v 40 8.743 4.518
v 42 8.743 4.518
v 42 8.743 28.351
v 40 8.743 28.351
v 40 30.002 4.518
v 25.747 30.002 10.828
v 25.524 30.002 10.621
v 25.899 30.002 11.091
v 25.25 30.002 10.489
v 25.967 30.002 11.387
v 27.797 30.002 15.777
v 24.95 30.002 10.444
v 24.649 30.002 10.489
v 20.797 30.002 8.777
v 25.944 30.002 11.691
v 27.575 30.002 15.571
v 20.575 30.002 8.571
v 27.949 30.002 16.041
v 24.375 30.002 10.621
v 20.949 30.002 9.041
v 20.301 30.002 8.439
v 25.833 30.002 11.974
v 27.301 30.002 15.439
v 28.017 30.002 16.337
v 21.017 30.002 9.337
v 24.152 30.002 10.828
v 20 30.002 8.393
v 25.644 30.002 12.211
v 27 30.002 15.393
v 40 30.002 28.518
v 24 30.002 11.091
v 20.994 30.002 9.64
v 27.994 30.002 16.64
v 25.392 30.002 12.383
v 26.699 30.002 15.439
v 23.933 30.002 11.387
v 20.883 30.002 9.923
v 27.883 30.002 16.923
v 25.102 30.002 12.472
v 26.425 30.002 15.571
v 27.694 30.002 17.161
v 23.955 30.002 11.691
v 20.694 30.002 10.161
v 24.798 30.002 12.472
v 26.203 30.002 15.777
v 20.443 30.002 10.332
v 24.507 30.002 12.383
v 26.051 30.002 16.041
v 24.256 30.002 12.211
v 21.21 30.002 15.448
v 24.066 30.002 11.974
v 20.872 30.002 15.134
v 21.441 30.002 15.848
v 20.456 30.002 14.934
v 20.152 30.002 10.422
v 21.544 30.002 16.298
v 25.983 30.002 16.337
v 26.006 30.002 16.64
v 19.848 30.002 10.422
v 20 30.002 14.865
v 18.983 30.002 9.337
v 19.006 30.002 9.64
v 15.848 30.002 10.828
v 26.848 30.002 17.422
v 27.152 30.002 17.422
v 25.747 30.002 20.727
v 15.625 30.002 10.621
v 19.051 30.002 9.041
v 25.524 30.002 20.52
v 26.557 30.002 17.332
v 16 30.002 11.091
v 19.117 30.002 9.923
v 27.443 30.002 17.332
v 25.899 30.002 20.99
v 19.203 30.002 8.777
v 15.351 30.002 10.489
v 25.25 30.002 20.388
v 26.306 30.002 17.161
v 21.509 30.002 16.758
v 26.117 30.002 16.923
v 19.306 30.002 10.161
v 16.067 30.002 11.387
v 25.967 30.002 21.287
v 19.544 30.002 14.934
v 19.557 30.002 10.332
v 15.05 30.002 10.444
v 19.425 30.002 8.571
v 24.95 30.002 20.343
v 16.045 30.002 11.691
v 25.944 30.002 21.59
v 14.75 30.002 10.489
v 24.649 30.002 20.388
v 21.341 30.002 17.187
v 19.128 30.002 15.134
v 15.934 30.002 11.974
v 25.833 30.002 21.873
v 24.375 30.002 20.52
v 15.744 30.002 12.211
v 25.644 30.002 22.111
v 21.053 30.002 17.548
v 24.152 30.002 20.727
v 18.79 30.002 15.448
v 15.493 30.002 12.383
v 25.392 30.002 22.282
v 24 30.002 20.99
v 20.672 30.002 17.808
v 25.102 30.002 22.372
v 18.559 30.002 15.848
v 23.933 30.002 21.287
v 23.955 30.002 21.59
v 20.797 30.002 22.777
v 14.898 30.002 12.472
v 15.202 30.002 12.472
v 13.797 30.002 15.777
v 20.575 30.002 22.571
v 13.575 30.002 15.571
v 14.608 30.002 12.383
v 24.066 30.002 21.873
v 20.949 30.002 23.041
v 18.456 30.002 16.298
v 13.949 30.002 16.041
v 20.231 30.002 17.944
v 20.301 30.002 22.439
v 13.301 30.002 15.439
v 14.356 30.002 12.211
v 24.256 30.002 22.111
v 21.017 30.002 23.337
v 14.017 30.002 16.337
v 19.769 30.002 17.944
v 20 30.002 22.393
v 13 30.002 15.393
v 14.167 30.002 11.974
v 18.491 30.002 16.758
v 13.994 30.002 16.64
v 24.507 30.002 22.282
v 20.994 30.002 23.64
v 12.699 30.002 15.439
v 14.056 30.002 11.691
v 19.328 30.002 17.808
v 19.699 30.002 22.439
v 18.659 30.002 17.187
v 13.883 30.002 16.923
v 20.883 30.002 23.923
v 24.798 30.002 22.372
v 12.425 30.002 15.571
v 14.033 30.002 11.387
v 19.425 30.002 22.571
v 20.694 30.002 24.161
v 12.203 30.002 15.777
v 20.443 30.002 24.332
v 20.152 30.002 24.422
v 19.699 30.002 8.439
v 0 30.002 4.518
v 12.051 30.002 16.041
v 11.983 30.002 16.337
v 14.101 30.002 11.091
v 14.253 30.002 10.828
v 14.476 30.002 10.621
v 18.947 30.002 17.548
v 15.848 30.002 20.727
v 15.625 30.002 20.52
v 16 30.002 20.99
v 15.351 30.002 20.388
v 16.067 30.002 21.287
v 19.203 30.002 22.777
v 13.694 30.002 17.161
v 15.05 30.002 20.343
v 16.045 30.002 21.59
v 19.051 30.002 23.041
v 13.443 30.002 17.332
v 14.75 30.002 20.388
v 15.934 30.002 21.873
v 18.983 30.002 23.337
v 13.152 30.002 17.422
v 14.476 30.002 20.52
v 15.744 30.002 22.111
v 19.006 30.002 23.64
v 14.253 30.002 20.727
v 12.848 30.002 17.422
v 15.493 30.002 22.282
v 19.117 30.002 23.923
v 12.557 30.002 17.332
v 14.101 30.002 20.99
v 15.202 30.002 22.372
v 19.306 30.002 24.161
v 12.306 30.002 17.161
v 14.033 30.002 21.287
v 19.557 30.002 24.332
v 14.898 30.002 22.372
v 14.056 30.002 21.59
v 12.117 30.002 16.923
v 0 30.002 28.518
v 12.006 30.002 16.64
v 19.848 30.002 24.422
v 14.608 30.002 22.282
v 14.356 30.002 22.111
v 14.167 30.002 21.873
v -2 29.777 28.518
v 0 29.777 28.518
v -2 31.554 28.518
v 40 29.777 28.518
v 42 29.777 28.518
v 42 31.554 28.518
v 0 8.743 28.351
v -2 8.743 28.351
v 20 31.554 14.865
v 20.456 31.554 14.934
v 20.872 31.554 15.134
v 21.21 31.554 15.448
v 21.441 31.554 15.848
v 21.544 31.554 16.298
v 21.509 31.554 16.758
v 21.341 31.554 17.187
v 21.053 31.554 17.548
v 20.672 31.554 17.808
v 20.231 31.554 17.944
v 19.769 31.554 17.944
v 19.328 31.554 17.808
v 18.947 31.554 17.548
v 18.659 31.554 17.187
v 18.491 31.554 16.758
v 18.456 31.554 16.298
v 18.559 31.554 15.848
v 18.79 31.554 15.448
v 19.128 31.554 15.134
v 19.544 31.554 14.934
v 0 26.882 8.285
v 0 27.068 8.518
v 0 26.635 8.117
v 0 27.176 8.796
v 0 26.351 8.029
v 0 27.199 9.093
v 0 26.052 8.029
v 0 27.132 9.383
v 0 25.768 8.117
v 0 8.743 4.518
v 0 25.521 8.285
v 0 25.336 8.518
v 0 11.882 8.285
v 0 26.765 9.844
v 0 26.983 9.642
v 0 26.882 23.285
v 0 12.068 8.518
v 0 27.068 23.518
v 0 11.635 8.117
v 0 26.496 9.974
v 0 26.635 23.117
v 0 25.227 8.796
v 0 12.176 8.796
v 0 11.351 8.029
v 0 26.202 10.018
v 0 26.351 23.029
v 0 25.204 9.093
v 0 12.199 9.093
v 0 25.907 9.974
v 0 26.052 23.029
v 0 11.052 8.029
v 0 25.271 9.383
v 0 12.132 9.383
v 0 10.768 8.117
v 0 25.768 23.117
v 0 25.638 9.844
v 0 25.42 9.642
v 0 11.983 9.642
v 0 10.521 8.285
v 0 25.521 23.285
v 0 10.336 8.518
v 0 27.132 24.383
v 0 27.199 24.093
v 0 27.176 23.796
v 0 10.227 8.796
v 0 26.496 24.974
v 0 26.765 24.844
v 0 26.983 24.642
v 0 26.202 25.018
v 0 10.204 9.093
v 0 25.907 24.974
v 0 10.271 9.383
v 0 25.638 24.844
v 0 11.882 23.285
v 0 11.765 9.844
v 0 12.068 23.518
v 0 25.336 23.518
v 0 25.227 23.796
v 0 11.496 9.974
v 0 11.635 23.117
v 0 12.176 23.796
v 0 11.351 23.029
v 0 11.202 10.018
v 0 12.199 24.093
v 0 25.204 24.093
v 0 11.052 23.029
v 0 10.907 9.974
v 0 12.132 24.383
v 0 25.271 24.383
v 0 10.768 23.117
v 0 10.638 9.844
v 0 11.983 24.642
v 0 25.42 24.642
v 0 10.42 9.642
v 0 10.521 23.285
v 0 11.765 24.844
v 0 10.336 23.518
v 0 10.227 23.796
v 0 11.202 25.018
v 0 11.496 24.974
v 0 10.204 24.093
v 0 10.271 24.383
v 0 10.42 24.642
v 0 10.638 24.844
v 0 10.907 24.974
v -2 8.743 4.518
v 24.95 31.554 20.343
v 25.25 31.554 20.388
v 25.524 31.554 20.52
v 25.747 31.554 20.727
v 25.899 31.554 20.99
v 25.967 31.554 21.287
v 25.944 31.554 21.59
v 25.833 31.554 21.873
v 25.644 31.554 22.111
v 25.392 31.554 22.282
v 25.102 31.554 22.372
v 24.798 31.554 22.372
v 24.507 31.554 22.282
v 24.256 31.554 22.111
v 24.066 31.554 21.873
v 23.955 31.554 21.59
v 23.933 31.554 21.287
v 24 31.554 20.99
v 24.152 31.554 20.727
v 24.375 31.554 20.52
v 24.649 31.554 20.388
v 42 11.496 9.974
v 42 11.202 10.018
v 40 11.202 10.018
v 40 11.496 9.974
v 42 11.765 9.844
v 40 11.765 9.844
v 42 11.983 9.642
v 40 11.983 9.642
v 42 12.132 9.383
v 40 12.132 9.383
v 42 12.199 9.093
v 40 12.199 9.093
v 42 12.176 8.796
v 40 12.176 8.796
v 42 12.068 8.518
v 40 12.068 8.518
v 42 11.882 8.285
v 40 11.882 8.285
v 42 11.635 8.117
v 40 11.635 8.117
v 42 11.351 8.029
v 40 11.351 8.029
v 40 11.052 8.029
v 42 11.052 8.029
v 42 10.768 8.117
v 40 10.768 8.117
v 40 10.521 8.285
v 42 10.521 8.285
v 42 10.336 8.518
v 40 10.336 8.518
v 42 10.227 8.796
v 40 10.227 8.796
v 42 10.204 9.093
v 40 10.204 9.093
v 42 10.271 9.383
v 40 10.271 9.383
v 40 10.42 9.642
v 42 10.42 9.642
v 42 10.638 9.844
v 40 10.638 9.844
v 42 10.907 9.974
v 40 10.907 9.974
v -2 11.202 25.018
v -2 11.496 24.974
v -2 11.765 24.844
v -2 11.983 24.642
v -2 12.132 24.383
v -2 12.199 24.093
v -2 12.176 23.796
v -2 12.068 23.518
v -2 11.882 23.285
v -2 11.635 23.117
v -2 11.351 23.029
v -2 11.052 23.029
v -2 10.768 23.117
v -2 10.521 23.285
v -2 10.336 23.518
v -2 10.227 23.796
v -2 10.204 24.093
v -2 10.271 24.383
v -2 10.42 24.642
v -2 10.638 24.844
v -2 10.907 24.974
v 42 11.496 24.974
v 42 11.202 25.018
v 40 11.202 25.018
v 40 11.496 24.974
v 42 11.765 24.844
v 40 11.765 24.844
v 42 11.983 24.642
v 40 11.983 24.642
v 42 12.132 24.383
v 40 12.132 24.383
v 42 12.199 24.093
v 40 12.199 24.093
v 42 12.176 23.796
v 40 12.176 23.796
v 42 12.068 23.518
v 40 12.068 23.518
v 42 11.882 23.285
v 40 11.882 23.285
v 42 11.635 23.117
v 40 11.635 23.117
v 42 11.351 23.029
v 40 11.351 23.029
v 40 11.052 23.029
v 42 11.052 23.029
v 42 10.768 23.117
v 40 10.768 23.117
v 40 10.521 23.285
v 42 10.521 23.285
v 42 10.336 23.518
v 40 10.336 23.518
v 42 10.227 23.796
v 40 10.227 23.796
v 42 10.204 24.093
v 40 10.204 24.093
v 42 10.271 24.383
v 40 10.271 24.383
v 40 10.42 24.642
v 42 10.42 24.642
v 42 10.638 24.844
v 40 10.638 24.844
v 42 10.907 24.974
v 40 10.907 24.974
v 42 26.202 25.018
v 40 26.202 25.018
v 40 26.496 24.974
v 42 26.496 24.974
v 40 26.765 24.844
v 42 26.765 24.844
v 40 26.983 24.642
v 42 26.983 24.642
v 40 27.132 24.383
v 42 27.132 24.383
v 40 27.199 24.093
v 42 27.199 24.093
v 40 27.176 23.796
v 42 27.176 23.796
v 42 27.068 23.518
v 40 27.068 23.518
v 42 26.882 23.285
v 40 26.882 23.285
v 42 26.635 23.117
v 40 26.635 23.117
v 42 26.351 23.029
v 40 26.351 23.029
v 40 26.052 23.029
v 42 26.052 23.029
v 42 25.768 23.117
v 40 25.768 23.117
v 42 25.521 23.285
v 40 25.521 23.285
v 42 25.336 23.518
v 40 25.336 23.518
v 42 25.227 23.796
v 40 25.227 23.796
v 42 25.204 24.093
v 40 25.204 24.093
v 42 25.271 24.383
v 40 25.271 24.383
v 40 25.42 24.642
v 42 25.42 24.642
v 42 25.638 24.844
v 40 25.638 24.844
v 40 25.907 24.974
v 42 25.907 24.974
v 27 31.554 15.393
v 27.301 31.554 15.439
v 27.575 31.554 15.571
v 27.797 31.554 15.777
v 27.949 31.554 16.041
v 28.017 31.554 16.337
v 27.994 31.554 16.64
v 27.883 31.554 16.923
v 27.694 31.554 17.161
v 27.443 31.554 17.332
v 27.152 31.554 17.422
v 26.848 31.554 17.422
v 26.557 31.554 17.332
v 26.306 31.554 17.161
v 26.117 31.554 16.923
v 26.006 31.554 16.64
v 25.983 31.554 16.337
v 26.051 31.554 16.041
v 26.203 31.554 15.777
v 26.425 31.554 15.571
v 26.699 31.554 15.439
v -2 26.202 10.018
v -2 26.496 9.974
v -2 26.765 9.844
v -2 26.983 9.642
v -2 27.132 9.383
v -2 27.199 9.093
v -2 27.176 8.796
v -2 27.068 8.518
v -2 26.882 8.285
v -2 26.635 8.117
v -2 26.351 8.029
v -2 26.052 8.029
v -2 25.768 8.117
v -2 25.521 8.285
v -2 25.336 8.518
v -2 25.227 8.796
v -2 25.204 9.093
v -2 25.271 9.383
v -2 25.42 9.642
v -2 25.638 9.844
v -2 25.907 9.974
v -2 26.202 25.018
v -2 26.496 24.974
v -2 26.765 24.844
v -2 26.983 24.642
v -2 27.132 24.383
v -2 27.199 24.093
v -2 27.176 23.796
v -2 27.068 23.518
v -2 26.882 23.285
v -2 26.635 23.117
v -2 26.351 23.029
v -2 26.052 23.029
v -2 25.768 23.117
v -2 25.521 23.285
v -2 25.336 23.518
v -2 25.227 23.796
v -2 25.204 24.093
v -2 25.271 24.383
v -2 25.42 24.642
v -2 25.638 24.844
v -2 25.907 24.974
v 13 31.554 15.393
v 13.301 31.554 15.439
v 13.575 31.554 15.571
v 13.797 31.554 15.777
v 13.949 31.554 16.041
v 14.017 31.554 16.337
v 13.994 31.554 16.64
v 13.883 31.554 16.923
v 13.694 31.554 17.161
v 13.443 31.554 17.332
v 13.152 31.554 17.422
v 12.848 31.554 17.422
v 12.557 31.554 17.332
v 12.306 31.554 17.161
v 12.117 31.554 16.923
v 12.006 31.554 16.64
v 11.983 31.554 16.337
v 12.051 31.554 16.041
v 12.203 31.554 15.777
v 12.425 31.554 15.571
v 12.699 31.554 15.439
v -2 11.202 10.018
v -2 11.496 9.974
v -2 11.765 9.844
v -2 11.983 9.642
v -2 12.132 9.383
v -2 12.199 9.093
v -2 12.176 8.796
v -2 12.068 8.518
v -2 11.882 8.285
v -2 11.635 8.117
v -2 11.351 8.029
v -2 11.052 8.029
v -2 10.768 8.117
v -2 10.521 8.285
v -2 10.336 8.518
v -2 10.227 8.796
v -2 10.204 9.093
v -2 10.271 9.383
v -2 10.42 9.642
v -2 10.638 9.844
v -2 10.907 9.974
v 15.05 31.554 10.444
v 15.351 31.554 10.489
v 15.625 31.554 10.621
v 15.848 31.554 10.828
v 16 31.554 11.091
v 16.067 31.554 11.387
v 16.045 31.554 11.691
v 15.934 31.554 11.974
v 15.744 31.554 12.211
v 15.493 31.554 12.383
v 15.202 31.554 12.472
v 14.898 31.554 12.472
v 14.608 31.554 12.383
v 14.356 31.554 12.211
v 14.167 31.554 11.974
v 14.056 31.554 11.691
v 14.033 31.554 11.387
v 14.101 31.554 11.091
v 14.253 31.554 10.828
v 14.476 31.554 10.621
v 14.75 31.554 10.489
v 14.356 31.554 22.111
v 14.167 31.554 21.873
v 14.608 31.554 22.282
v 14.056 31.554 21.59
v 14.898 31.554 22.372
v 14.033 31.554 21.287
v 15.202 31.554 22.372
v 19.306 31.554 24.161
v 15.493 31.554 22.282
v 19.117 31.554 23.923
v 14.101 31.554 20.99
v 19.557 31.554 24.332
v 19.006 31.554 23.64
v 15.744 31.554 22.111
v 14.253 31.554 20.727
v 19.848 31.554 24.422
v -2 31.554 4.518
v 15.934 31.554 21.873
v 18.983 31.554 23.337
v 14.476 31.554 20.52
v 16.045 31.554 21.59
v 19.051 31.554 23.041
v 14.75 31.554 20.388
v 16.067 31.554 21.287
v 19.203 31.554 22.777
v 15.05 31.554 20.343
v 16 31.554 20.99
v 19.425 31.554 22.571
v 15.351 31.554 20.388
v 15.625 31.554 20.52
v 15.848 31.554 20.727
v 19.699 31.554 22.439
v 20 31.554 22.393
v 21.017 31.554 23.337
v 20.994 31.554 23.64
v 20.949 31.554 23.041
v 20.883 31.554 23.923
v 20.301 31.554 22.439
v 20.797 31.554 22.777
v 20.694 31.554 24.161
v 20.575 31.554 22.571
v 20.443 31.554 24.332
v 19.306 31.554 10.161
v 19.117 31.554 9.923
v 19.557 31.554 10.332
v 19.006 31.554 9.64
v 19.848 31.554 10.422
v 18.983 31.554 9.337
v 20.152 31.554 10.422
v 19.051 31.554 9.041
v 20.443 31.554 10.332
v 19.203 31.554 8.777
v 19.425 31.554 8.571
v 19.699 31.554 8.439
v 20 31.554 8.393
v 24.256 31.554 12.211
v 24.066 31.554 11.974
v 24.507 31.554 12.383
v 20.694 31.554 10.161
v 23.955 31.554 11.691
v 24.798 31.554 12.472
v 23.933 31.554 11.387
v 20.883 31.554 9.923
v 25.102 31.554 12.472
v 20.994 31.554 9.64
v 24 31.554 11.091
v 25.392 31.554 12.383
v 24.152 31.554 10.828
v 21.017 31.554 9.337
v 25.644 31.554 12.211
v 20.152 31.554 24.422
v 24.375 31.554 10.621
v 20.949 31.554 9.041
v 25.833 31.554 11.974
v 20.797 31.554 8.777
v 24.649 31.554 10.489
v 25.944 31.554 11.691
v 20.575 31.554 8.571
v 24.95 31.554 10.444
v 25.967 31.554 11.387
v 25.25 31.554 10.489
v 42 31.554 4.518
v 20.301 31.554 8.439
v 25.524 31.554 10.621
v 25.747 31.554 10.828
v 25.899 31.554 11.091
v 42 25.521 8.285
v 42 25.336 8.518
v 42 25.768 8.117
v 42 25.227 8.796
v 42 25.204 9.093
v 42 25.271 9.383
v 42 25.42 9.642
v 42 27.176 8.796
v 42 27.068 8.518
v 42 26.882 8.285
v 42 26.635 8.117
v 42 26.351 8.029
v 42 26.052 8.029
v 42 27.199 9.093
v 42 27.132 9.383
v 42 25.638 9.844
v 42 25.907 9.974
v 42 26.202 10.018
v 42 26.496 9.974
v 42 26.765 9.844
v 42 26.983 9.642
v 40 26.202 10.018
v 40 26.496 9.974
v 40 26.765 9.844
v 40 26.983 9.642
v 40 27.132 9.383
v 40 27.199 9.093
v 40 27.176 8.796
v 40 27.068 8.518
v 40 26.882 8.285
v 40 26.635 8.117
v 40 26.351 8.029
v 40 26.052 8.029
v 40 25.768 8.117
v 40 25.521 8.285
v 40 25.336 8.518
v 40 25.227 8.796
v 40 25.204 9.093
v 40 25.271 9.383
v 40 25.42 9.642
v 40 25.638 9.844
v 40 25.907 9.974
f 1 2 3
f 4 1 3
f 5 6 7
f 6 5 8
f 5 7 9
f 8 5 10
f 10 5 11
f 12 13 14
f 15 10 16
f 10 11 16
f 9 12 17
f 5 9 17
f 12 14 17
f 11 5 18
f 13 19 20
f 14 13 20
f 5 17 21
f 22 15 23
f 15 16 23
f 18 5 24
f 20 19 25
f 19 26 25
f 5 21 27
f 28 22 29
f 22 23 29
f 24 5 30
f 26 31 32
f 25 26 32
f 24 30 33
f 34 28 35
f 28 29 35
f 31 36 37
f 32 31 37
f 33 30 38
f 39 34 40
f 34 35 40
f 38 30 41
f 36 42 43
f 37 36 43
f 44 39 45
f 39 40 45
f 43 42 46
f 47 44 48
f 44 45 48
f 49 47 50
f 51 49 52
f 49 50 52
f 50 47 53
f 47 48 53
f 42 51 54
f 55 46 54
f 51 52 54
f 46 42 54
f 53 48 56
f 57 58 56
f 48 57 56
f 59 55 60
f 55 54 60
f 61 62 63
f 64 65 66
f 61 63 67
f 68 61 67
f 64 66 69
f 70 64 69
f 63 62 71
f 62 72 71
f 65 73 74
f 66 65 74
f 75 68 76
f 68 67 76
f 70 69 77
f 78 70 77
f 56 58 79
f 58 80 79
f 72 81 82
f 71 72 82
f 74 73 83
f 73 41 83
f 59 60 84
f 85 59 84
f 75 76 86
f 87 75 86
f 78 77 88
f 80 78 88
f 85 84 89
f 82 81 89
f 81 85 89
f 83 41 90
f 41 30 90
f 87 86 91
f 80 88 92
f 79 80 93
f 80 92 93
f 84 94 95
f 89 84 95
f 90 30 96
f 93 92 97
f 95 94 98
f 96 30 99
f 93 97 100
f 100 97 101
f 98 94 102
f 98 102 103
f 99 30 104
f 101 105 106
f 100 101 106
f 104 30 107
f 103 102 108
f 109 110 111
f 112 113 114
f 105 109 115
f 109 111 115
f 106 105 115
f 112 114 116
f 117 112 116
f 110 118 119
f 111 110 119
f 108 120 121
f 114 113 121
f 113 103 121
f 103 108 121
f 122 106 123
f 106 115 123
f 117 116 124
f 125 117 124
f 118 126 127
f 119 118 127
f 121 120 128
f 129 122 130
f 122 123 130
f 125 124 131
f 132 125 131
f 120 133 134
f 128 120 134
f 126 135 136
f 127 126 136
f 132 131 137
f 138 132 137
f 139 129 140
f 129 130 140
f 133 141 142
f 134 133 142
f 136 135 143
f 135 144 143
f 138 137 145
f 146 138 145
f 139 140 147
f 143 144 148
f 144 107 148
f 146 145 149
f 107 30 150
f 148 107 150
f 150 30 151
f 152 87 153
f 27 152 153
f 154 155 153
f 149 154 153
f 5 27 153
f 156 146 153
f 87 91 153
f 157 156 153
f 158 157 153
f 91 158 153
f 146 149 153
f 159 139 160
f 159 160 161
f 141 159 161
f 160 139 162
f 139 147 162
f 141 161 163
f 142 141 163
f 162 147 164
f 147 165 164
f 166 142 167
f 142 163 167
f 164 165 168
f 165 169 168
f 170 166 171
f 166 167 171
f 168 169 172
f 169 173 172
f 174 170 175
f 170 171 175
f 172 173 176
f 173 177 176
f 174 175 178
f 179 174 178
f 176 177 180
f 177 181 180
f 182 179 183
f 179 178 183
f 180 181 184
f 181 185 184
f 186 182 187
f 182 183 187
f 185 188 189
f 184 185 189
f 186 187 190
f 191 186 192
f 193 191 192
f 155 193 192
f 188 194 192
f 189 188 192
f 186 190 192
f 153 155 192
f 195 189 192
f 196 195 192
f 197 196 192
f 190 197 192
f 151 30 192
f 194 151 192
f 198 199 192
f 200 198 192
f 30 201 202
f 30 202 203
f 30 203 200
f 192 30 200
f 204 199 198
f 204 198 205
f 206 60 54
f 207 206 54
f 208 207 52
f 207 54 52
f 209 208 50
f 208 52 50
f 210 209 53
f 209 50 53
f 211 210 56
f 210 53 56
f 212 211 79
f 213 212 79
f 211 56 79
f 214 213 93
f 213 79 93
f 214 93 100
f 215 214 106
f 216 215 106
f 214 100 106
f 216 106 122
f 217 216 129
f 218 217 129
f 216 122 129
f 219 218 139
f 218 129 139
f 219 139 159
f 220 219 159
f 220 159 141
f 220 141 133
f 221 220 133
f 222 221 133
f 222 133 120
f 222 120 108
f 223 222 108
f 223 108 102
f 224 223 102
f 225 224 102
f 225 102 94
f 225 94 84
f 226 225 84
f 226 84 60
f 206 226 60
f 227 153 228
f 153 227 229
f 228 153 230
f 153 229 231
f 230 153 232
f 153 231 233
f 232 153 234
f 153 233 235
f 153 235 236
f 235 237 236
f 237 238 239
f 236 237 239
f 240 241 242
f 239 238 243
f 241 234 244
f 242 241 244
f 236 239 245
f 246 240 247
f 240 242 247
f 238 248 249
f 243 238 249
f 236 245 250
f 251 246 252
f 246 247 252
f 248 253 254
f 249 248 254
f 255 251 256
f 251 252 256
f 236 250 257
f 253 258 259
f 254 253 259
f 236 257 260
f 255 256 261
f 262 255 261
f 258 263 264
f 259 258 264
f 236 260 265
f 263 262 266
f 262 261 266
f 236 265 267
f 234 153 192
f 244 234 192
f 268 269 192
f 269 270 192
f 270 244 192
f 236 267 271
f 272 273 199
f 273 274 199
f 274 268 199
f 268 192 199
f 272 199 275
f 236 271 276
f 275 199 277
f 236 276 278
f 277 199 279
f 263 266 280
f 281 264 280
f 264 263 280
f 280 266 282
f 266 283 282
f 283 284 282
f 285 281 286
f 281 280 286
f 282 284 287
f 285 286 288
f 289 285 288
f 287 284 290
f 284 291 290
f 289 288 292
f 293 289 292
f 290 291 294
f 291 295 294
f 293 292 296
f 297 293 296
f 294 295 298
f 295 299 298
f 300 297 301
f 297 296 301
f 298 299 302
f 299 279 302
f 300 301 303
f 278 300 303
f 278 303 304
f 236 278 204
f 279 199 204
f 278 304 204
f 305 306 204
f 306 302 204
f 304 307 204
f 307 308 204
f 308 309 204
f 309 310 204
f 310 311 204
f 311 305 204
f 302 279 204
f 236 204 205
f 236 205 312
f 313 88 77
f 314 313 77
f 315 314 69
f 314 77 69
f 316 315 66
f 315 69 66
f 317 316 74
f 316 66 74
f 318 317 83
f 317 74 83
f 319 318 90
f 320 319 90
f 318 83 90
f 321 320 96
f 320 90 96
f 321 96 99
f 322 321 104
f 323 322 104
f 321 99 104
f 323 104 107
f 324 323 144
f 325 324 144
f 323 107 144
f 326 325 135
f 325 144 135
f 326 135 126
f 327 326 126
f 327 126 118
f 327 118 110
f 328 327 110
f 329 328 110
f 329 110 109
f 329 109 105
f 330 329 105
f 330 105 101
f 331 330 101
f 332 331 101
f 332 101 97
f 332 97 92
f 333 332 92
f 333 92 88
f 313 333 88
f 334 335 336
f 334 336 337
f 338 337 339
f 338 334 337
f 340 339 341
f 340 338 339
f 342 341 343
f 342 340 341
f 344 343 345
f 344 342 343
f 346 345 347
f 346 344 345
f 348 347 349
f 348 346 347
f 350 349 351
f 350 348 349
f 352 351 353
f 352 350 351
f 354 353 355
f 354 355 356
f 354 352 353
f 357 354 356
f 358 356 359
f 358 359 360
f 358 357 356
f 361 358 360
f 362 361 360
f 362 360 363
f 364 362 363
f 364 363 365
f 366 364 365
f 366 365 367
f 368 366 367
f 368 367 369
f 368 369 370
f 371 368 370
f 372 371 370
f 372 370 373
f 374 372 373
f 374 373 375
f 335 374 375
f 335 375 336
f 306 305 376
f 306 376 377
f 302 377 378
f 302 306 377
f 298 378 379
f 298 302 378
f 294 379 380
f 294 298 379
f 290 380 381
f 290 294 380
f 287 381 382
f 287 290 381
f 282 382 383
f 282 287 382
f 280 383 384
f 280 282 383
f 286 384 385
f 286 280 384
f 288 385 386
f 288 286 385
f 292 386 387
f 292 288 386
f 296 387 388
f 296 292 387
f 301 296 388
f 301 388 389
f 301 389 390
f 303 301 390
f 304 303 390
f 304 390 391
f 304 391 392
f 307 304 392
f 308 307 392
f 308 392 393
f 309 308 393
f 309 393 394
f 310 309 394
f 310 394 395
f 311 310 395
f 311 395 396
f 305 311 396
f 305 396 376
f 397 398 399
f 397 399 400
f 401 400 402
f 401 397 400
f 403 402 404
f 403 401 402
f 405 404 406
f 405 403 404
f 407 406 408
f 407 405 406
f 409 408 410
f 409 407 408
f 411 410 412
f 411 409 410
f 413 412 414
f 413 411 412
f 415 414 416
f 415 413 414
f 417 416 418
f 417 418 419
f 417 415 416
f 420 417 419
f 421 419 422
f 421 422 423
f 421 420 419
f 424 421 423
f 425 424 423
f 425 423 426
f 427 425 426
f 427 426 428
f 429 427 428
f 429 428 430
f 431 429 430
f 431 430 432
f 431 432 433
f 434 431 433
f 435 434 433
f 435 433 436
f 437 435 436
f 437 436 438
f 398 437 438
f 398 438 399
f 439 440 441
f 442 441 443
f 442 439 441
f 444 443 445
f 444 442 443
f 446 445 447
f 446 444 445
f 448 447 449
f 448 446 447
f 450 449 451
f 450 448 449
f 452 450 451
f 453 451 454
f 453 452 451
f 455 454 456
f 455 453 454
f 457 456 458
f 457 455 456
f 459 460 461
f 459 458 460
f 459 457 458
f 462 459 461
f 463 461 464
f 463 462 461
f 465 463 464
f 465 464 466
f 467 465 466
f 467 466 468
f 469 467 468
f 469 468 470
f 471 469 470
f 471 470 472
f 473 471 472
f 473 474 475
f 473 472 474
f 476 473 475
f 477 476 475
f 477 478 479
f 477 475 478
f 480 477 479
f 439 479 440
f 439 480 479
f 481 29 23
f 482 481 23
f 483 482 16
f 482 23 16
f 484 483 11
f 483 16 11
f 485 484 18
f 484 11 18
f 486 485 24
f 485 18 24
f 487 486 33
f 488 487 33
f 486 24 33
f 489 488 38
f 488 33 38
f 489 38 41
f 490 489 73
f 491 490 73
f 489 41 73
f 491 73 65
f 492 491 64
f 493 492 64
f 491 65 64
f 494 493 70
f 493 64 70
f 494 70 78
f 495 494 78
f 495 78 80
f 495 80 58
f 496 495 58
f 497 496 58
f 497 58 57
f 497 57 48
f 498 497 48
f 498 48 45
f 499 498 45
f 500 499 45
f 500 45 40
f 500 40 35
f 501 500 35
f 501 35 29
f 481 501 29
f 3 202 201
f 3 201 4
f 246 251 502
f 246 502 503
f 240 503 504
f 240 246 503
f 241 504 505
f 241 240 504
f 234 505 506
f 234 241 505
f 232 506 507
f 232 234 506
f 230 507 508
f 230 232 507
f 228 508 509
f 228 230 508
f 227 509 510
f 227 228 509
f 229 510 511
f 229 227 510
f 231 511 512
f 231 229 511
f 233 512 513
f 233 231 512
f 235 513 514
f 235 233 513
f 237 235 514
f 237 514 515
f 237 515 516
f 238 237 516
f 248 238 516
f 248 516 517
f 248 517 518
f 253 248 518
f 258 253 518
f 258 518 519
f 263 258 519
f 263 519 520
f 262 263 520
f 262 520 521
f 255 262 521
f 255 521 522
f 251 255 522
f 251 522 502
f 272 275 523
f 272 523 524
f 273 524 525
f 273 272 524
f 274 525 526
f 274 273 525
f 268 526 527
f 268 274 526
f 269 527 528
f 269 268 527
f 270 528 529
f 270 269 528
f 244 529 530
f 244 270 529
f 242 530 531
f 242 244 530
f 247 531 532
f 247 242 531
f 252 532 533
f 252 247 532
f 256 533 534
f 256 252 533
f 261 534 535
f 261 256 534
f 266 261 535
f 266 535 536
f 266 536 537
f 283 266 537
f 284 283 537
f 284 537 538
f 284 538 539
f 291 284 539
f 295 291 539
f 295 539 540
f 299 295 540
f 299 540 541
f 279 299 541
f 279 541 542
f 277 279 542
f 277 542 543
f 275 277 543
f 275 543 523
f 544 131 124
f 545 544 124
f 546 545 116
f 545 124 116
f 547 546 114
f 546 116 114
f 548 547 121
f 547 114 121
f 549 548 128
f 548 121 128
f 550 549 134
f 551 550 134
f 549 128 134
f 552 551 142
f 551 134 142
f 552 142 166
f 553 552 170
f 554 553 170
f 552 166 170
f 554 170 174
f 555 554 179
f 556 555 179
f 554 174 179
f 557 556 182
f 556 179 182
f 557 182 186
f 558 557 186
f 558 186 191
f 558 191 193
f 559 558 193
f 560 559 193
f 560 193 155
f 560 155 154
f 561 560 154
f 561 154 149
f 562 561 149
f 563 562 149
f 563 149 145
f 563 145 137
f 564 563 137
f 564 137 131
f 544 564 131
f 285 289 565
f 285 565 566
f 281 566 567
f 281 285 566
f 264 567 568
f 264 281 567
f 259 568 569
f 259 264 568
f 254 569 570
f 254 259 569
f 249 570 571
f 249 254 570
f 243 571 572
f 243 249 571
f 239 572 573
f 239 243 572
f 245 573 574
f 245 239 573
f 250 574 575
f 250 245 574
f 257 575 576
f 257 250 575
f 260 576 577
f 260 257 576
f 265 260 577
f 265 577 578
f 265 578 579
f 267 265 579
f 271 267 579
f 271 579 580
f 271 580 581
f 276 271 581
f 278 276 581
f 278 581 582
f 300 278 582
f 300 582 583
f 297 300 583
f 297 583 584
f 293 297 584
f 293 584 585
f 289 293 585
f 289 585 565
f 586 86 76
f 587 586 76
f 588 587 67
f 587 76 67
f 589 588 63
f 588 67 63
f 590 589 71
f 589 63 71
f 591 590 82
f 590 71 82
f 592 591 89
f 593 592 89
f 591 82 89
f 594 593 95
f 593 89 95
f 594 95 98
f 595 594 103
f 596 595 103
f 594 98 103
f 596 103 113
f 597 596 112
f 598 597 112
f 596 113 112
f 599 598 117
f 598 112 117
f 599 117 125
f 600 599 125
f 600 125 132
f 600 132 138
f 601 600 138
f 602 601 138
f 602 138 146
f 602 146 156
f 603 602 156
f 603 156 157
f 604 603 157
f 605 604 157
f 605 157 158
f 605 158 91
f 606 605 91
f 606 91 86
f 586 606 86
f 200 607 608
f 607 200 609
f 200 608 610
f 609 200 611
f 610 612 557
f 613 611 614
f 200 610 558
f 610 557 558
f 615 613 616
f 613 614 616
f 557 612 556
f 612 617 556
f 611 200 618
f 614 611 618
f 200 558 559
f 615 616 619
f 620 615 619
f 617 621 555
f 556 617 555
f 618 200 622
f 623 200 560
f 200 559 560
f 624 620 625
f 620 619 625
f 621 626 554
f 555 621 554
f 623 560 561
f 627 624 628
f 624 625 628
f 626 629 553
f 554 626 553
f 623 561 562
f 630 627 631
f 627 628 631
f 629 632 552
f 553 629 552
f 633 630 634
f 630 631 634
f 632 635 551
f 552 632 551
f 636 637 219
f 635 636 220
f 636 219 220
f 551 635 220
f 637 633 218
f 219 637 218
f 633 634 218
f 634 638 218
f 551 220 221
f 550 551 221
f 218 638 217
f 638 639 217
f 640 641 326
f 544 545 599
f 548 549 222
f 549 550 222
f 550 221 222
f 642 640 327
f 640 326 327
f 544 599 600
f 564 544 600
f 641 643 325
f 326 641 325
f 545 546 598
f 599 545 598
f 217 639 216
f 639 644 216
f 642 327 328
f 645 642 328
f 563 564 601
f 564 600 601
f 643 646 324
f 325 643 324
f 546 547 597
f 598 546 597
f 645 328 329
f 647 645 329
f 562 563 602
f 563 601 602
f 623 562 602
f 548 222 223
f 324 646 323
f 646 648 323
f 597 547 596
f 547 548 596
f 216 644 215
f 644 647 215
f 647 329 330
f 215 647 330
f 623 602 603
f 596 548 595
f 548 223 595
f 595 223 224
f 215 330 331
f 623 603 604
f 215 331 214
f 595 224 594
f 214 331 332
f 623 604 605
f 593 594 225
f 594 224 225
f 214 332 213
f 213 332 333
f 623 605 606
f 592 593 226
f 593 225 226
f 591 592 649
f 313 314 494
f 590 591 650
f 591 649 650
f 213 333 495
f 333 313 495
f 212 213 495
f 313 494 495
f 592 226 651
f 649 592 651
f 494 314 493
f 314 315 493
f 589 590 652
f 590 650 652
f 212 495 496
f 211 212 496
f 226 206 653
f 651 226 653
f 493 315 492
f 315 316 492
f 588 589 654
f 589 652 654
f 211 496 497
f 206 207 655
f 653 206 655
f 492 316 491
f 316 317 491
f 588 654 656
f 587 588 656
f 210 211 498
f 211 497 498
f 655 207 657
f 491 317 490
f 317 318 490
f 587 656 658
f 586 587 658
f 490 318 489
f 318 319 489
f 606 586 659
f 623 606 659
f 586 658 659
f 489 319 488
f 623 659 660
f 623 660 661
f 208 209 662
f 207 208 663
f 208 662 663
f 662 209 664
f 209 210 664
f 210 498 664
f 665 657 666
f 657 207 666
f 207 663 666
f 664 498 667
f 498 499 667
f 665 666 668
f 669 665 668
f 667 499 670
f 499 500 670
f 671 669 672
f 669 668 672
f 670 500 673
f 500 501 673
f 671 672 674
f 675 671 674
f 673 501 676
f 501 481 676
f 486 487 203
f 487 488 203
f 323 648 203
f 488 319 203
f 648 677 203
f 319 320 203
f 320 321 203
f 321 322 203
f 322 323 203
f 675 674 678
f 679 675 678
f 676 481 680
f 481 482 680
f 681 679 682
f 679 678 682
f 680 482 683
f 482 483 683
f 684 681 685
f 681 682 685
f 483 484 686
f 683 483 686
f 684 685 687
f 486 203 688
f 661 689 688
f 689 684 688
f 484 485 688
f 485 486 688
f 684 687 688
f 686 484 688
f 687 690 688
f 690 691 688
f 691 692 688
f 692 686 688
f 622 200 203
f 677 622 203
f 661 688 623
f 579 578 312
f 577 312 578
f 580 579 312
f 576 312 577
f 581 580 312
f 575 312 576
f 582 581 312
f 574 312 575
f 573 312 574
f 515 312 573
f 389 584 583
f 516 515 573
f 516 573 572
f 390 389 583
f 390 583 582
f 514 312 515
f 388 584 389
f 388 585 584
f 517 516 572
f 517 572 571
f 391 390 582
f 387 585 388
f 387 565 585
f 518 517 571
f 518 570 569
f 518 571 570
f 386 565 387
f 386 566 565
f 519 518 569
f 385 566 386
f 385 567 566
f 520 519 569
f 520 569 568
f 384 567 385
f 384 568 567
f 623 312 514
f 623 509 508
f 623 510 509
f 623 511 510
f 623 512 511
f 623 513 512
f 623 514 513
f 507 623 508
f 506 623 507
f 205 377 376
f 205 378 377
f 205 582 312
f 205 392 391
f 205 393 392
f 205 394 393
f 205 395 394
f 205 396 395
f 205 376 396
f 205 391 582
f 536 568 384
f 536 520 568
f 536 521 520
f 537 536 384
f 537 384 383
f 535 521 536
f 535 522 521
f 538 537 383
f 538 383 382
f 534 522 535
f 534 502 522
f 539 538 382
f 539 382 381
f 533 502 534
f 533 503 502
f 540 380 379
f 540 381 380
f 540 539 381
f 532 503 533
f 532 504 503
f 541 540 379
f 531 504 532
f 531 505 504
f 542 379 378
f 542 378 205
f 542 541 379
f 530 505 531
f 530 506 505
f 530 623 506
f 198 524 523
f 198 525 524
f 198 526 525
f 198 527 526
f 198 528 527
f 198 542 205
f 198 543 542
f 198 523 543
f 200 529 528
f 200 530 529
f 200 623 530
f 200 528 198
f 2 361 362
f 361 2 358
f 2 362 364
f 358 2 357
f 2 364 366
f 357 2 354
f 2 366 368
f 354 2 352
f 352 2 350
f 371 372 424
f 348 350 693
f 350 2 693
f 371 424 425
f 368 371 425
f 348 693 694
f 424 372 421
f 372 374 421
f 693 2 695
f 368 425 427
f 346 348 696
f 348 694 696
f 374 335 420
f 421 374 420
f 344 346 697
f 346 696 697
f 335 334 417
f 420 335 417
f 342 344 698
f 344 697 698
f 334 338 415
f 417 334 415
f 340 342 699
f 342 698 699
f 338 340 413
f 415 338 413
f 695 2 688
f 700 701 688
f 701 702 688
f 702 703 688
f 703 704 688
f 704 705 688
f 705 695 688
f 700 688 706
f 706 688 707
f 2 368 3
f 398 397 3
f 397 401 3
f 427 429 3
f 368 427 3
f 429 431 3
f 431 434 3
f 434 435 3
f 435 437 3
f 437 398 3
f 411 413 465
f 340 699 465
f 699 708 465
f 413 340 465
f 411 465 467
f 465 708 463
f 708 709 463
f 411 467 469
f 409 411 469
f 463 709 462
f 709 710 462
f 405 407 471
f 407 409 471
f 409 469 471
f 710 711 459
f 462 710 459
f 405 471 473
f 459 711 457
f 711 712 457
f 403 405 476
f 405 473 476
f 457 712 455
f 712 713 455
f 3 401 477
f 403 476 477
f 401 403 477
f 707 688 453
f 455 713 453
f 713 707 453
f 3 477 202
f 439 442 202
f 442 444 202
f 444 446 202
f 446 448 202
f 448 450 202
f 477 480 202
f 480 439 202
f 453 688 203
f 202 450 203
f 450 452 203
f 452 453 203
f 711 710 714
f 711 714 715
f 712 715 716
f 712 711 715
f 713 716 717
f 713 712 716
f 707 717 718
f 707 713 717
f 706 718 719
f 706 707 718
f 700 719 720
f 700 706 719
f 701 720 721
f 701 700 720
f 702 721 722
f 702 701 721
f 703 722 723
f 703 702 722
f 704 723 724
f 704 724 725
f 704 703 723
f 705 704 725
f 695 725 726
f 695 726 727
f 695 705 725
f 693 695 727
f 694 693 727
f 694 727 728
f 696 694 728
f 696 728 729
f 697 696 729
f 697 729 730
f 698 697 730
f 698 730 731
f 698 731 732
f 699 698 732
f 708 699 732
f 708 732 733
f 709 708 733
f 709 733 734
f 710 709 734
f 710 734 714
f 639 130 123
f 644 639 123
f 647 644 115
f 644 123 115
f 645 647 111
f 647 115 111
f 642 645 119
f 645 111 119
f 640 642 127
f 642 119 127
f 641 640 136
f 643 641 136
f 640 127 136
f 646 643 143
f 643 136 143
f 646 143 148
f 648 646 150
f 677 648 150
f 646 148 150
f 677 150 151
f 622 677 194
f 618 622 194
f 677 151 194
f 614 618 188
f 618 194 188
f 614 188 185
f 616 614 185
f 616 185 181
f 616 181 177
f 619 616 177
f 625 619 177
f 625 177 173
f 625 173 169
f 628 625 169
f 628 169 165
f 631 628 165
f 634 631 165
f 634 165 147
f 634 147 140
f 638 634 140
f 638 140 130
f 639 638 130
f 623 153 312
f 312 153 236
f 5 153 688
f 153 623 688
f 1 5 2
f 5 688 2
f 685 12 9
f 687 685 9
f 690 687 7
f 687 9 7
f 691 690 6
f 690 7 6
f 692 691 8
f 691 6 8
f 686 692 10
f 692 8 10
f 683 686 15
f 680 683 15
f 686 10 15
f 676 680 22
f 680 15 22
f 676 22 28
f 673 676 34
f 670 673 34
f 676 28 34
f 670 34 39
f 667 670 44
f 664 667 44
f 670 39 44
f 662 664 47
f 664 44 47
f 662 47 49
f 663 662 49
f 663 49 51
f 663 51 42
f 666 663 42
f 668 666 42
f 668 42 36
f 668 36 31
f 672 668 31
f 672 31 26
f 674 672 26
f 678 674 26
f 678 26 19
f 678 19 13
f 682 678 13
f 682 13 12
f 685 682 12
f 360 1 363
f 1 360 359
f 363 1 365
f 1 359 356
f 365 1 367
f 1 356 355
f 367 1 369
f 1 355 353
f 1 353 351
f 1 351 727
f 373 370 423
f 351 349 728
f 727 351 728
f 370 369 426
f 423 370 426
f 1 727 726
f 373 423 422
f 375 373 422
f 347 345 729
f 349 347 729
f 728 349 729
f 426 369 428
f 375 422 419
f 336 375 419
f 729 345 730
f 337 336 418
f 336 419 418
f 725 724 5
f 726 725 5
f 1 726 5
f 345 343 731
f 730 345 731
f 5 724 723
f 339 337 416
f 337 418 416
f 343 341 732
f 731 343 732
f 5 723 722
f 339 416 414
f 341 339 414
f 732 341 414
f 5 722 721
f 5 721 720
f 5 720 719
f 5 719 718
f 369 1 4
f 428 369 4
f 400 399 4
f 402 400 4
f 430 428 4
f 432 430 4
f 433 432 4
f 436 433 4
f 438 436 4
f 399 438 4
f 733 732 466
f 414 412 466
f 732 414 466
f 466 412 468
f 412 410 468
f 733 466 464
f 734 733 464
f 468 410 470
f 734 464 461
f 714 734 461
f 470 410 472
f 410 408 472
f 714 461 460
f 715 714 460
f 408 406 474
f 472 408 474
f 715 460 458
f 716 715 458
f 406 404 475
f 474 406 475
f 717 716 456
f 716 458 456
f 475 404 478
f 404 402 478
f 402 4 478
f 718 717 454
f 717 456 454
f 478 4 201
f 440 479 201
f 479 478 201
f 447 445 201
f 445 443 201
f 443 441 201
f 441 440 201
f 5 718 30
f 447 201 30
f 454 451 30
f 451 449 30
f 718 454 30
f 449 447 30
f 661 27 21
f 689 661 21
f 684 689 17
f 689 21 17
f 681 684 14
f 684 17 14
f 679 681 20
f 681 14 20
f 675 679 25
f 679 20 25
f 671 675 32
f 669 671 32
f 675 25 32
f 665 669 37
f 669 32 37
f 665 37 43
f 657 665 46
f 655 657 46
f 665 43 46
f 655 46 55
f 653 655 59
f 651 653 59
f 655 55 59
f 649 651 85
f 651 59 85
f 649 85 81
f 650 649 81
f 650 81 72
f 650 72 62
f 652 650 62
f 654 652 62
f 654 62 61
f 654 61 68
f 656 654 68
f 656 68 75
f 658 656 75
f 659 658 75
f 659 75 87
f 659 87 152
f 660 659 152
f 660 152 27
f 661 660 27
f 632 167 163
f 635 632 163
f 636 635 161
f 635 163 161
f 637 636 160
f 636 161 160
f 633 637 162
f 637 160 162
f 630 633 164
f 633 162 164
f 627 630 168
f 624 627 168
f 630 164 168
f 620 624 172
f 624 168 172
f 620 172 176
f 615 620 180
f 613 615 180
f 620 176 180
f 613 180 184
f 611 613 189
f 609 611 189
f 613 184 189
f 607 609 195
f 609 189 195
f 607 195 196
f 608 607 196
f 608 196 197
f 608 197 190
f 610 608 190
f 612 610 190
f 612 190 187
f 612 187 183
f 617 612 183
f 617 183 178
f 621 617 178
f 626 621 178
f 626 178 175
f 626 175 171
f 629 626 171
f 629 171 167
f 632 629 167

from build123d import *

# Parameters (mm, degrees)
SKETCH_1_W               = 20
SKETCH_1_H               = 40
EXTRUDE_1_DEPTH          = 40
SKETCH_2_R               = 1
CUT_EXTRUDE_3_DEPTH      = 40
EXTRUDE_2_DEPTH          = 5
EXTRUDE_2_DEPTH_BACK     = 45
CHAMFER_1_SIZE           = 2
FILLET_1_R               = 1
SKETCH_5_R               = 3
EXTRUDE_3_DEPTH          = 50
EXTRUDE_4_DEPTH          = 1.5
EXTRUDE_4_DEPTH_BACK     = 53
SKETCH_7_R               = 3
SKETCH_12_W              = 1.5
SKETCH_12_H              = 6.856105301
CUT_EXTRUDE_6_DEPTH      = 25.5
EXTRUDE_START            = 6.5
SKETCH_9_R               = 3
EXTRUDE_7_DEPTH          = 6.5
EXTRUDE_9_DEPTH          = 2
EXTRUDE_9_DEPTH_BACK     = 42
SKETCH_13_R              = 1
CUT_EXTRUDE_8_DEPTH      = 42
CUT_EXTRUDE_8_DEPTH_BACK = 42
SKETCH_15_R              = 1.548049479
SKETCH_15_R_2            = 1.02
CUT_EXTRUDE_9_DEPTH      = 42


with BuildPart() as part:
    # ｽｹｯﾁ1 → ﾎﾞｽ - 押し出し1 (new body)
    with BuildSketch(Plane(origin=(0, 0, 0), x_dir=(0, 0, -1), z_dir=(1, 0, 0))):
        with Locations((-16.51810585, 9.247910864)):
            Rectangle(SKETCH_1_W, SKETCH_1_H)
    extrude(amount=EXTRUDE_1_DEPTH)

    # ｽｹｯﾁ2 → ｶｯﾄ - 押し出し3 (cut)
    with BuildSketch(Plane.ZY):
        with Locations((9.01810585, 26.201539891)):
            Circle(SKETCH_2_R)
        with Locations((9.01810585, 11.201539891)):
            Circle(SKETCH_2_R)
        with Locations((24.01810585, 11.201539891)):
            Circle(SKETCH_2_R)
        with Locations((24.01810585, 26.201539891)):
            Circle(SKETCH_2_R)
    extrude(amount=-CUT_EXTRUDE_3_DEPTH, mode=Mode.SUBTRACT)

    # ｽｹｯﾁ4 → ﾎﾞｽ - 押し出し2 (add, two sides: drawn at the far end of the back side and taken through both)
    with BuildSketch(Plane.ZY.offset(-EXTRUDE_2_DEPTH_BACK)):
        with BuildLine():
            ThreePointArc((16.51810585, -2.252089136), (17.578766021, -1.812749308), (18.01810585, -0.752089136))
            ThreePointArc((18.01810585, -0.752089136), (15.457445678, 0.308571035), (16.51810585, -2.252089136))
        make_face()
    extrude(amount=EXTRUDE_2_DEPTH + EXTRUDE_2_DEPTH_BACK)

    # 面取り1
    chamfer_1_edges = [part.edges().sort_by_distance(p)[0] for p in [
        (20, 29.247910864, 26.51810585),
        (20, 29.247910864, 6.51810585),
        (20, -10.752089136, 6.51810585),
        (20, -10.752089136, 26.51810585),
    ]]
    chamfer(chamfer_1_edges, length=CHAMFER_1_SIZE)

    # ﾌｨﾚｯﾄ1
    fillet_1_edges = [part.edges().sort_by_distance(p)[0] for p in [
        (0, 28.247910864, 25.51810585),
        (0, 29.247910864, 16.51810585),
        (0, 28.247910864, 7.51810585),
        (0, 9.247910864, 6.51810585),
        (0, -9.752089136, 7.51810585),
        (0, -10.752089136, 16.51810585),
        (0, -9.752089136, 25.51810585),
        (0, 9.247910864, 26.51810585),
        (40, -9.752089136, 7.51810585),
        (40, -10.752089136, 16.51810585),
        (40, -9.752089136, 25.51810585),
        (40, 9.247910864, 26.51810585),
        (40, 28.247910864, 25.51810585),
        (40, 29.247910864, 16.51810585),
        (40, 28.247910864, 7.51810585),
        (40, 9.247910864, 6.51810585),
    ]]
    fillet(fillet_1_edges, radius=FILLET_1_R)

    # ｽｹｯﾁ5 → ﾎﾞｽ - 押し出し3 (add)
    with BuildSketch(Plane.ZY.offset(5)):
        with Locations((16.51810585, -0.752089136)):
            Circle(SKETCH_5_R)
    extrude(amount=-EXTRUDE_3_DEPTH)

    # ｽｹｯﾁ7 → ﾎﾞｽ - 押し出し4 (add, two sides: drawn at the far end of the back side and taken through both)
    with BuildSketch(Plane.ZY.offset(5).offset(-EXTRUDE_4_DEPTH_BACK)):
        with Locations((16.51810585, -0.752089136)):
            Circle(SKETCH_7_R)
    extrude(amount=EXTRUDE_4_DEPTH + EXTRUDE_4_DEPTH_BACK)

    # ｽｹｯﾁ12 → ｶｯﾄ - 押し出し6 (cut)
    with BuildSketch(Plane.XY):
        with Locations((47.25, -0.324036486)):
            Rectangle(SKETCH_12_W, SKETCH_12_H)
    extrude(amount=CUT_EXTRUDE_6_DEPTH, mode=Mode.SUBTRACT)

    # ｽｹｯﾁ9 → ﾎﾞｽ - 押し出し7 (add)
    with BuildSketch(Plane.ZY.offset(EXTRUDE_START)):
        with Locations((16.51810585, -0.752089136)):
            Circle(SKETCH_9_R)
    extrude(amount=-EXTRUDE_7_DEPTH)

    # ｽｹｯﾁ13 → ﾎﾞｽ - 押し出し9 (add, two sides: drawn at the far end of the back side and taken through both)
    with BuildSketch(Plane.ZY.offset(-EXTRUDE_9_DEPTH_BACK)):
        Polygon((28.350606437, 8.743176741), (28.51810585, 29.776884849), (28.51810585, 31.554442305), (4.51810585, 31.554442305), (4.51810585, 8.743176741), align=None)
        with Locations((24.01810585, 26.201539891)):
            Circle(SKETCH_13_R, mode=Mode.SUBTRACT)
        with Locations((9.01810585, 11.201539891)):
            Circle(SKETCH_13_R, mode=Mode.SUBTRACT)
        with Locations((24.01810585, 11.201539891)):
            Circle(SKETCH_13_R, mode=Mode.SUBTRACT)
        with Locations((9.01810585, 26.201539891)):
            Circle(SKETCH_13_R, mode=Mode.SUBTRACT)
    extrude(amount=EXTRUDE_9_DEPTH + EXTRUDE_9_DEPTH_BACK)

    # ｽｹｯﾁ14 → ｶｯﾄ - 押し出し8 (cut, two sides: drawn at the far end of the back side and taken through both)
    with BuildSketch(Plane(origin=(0, 0, 6.51810585), x_dir=(-1, 0, 0), z_dir=(0, 0, -1)).offset(-CUT_EXTRUDE_8_DEPTH_BACK)):
        Polygon((-40, 2.426770895), (-40, 30.001767149), (0, 30.001767149), (0, 7.074046983), (16.825190811, 7.428599357), (20.42980661, -19.990117542), (-71.103797865, -17.153698552), (-61.176331402, 0), (-52.017061748, 5.892205738), align=None)
    extrude(amount=CUT_EXTRUDE_8_DEPTH + CUT_EXTRUDE_8_DEPTH_BACK, mode=Mode.SUBTRACT)

    # ｽｹｯﾁ15 → ｶｯﾄ - 押し出し9 (cut)
    with BuildSketch(Plane.XZ.offset(-30.001767149)):
        with Locations((20, 16.413361069)):
            Circle(SKETCH_15_R)
        with Locations((20, 23.413361069)):
            Circle(SKETCH_15_R_2)
        with Locations((15.050252532, 21.363108537)):
            Circle(SKETCH_15_R_2)
        with Locations((13, 16.413361069)):
            Circle(SKETCH_15_R_2)
        with Locations((15.050252532, 11.4636136)):
            Circle(SKETCH_15_R_2)
        with Locations((20, 9.413361069)):
            Circle(SKETCH_15_R_2)
        with Locations((24.949747468, 11.4636136)):
            Circle(SKETCH_15_R_2)
        with Locations((27, 16.413361069)):
            Circle(SKETCH_15_R_2)
        with Locations((24.949747468, 21.363108537)):
            Circle(SKETCH_15_R_2)
    extrude(amount=-CUT_EXTRUDE_9_DEPTH, mode=Mode.SUBTRACT)


solid = part.part
